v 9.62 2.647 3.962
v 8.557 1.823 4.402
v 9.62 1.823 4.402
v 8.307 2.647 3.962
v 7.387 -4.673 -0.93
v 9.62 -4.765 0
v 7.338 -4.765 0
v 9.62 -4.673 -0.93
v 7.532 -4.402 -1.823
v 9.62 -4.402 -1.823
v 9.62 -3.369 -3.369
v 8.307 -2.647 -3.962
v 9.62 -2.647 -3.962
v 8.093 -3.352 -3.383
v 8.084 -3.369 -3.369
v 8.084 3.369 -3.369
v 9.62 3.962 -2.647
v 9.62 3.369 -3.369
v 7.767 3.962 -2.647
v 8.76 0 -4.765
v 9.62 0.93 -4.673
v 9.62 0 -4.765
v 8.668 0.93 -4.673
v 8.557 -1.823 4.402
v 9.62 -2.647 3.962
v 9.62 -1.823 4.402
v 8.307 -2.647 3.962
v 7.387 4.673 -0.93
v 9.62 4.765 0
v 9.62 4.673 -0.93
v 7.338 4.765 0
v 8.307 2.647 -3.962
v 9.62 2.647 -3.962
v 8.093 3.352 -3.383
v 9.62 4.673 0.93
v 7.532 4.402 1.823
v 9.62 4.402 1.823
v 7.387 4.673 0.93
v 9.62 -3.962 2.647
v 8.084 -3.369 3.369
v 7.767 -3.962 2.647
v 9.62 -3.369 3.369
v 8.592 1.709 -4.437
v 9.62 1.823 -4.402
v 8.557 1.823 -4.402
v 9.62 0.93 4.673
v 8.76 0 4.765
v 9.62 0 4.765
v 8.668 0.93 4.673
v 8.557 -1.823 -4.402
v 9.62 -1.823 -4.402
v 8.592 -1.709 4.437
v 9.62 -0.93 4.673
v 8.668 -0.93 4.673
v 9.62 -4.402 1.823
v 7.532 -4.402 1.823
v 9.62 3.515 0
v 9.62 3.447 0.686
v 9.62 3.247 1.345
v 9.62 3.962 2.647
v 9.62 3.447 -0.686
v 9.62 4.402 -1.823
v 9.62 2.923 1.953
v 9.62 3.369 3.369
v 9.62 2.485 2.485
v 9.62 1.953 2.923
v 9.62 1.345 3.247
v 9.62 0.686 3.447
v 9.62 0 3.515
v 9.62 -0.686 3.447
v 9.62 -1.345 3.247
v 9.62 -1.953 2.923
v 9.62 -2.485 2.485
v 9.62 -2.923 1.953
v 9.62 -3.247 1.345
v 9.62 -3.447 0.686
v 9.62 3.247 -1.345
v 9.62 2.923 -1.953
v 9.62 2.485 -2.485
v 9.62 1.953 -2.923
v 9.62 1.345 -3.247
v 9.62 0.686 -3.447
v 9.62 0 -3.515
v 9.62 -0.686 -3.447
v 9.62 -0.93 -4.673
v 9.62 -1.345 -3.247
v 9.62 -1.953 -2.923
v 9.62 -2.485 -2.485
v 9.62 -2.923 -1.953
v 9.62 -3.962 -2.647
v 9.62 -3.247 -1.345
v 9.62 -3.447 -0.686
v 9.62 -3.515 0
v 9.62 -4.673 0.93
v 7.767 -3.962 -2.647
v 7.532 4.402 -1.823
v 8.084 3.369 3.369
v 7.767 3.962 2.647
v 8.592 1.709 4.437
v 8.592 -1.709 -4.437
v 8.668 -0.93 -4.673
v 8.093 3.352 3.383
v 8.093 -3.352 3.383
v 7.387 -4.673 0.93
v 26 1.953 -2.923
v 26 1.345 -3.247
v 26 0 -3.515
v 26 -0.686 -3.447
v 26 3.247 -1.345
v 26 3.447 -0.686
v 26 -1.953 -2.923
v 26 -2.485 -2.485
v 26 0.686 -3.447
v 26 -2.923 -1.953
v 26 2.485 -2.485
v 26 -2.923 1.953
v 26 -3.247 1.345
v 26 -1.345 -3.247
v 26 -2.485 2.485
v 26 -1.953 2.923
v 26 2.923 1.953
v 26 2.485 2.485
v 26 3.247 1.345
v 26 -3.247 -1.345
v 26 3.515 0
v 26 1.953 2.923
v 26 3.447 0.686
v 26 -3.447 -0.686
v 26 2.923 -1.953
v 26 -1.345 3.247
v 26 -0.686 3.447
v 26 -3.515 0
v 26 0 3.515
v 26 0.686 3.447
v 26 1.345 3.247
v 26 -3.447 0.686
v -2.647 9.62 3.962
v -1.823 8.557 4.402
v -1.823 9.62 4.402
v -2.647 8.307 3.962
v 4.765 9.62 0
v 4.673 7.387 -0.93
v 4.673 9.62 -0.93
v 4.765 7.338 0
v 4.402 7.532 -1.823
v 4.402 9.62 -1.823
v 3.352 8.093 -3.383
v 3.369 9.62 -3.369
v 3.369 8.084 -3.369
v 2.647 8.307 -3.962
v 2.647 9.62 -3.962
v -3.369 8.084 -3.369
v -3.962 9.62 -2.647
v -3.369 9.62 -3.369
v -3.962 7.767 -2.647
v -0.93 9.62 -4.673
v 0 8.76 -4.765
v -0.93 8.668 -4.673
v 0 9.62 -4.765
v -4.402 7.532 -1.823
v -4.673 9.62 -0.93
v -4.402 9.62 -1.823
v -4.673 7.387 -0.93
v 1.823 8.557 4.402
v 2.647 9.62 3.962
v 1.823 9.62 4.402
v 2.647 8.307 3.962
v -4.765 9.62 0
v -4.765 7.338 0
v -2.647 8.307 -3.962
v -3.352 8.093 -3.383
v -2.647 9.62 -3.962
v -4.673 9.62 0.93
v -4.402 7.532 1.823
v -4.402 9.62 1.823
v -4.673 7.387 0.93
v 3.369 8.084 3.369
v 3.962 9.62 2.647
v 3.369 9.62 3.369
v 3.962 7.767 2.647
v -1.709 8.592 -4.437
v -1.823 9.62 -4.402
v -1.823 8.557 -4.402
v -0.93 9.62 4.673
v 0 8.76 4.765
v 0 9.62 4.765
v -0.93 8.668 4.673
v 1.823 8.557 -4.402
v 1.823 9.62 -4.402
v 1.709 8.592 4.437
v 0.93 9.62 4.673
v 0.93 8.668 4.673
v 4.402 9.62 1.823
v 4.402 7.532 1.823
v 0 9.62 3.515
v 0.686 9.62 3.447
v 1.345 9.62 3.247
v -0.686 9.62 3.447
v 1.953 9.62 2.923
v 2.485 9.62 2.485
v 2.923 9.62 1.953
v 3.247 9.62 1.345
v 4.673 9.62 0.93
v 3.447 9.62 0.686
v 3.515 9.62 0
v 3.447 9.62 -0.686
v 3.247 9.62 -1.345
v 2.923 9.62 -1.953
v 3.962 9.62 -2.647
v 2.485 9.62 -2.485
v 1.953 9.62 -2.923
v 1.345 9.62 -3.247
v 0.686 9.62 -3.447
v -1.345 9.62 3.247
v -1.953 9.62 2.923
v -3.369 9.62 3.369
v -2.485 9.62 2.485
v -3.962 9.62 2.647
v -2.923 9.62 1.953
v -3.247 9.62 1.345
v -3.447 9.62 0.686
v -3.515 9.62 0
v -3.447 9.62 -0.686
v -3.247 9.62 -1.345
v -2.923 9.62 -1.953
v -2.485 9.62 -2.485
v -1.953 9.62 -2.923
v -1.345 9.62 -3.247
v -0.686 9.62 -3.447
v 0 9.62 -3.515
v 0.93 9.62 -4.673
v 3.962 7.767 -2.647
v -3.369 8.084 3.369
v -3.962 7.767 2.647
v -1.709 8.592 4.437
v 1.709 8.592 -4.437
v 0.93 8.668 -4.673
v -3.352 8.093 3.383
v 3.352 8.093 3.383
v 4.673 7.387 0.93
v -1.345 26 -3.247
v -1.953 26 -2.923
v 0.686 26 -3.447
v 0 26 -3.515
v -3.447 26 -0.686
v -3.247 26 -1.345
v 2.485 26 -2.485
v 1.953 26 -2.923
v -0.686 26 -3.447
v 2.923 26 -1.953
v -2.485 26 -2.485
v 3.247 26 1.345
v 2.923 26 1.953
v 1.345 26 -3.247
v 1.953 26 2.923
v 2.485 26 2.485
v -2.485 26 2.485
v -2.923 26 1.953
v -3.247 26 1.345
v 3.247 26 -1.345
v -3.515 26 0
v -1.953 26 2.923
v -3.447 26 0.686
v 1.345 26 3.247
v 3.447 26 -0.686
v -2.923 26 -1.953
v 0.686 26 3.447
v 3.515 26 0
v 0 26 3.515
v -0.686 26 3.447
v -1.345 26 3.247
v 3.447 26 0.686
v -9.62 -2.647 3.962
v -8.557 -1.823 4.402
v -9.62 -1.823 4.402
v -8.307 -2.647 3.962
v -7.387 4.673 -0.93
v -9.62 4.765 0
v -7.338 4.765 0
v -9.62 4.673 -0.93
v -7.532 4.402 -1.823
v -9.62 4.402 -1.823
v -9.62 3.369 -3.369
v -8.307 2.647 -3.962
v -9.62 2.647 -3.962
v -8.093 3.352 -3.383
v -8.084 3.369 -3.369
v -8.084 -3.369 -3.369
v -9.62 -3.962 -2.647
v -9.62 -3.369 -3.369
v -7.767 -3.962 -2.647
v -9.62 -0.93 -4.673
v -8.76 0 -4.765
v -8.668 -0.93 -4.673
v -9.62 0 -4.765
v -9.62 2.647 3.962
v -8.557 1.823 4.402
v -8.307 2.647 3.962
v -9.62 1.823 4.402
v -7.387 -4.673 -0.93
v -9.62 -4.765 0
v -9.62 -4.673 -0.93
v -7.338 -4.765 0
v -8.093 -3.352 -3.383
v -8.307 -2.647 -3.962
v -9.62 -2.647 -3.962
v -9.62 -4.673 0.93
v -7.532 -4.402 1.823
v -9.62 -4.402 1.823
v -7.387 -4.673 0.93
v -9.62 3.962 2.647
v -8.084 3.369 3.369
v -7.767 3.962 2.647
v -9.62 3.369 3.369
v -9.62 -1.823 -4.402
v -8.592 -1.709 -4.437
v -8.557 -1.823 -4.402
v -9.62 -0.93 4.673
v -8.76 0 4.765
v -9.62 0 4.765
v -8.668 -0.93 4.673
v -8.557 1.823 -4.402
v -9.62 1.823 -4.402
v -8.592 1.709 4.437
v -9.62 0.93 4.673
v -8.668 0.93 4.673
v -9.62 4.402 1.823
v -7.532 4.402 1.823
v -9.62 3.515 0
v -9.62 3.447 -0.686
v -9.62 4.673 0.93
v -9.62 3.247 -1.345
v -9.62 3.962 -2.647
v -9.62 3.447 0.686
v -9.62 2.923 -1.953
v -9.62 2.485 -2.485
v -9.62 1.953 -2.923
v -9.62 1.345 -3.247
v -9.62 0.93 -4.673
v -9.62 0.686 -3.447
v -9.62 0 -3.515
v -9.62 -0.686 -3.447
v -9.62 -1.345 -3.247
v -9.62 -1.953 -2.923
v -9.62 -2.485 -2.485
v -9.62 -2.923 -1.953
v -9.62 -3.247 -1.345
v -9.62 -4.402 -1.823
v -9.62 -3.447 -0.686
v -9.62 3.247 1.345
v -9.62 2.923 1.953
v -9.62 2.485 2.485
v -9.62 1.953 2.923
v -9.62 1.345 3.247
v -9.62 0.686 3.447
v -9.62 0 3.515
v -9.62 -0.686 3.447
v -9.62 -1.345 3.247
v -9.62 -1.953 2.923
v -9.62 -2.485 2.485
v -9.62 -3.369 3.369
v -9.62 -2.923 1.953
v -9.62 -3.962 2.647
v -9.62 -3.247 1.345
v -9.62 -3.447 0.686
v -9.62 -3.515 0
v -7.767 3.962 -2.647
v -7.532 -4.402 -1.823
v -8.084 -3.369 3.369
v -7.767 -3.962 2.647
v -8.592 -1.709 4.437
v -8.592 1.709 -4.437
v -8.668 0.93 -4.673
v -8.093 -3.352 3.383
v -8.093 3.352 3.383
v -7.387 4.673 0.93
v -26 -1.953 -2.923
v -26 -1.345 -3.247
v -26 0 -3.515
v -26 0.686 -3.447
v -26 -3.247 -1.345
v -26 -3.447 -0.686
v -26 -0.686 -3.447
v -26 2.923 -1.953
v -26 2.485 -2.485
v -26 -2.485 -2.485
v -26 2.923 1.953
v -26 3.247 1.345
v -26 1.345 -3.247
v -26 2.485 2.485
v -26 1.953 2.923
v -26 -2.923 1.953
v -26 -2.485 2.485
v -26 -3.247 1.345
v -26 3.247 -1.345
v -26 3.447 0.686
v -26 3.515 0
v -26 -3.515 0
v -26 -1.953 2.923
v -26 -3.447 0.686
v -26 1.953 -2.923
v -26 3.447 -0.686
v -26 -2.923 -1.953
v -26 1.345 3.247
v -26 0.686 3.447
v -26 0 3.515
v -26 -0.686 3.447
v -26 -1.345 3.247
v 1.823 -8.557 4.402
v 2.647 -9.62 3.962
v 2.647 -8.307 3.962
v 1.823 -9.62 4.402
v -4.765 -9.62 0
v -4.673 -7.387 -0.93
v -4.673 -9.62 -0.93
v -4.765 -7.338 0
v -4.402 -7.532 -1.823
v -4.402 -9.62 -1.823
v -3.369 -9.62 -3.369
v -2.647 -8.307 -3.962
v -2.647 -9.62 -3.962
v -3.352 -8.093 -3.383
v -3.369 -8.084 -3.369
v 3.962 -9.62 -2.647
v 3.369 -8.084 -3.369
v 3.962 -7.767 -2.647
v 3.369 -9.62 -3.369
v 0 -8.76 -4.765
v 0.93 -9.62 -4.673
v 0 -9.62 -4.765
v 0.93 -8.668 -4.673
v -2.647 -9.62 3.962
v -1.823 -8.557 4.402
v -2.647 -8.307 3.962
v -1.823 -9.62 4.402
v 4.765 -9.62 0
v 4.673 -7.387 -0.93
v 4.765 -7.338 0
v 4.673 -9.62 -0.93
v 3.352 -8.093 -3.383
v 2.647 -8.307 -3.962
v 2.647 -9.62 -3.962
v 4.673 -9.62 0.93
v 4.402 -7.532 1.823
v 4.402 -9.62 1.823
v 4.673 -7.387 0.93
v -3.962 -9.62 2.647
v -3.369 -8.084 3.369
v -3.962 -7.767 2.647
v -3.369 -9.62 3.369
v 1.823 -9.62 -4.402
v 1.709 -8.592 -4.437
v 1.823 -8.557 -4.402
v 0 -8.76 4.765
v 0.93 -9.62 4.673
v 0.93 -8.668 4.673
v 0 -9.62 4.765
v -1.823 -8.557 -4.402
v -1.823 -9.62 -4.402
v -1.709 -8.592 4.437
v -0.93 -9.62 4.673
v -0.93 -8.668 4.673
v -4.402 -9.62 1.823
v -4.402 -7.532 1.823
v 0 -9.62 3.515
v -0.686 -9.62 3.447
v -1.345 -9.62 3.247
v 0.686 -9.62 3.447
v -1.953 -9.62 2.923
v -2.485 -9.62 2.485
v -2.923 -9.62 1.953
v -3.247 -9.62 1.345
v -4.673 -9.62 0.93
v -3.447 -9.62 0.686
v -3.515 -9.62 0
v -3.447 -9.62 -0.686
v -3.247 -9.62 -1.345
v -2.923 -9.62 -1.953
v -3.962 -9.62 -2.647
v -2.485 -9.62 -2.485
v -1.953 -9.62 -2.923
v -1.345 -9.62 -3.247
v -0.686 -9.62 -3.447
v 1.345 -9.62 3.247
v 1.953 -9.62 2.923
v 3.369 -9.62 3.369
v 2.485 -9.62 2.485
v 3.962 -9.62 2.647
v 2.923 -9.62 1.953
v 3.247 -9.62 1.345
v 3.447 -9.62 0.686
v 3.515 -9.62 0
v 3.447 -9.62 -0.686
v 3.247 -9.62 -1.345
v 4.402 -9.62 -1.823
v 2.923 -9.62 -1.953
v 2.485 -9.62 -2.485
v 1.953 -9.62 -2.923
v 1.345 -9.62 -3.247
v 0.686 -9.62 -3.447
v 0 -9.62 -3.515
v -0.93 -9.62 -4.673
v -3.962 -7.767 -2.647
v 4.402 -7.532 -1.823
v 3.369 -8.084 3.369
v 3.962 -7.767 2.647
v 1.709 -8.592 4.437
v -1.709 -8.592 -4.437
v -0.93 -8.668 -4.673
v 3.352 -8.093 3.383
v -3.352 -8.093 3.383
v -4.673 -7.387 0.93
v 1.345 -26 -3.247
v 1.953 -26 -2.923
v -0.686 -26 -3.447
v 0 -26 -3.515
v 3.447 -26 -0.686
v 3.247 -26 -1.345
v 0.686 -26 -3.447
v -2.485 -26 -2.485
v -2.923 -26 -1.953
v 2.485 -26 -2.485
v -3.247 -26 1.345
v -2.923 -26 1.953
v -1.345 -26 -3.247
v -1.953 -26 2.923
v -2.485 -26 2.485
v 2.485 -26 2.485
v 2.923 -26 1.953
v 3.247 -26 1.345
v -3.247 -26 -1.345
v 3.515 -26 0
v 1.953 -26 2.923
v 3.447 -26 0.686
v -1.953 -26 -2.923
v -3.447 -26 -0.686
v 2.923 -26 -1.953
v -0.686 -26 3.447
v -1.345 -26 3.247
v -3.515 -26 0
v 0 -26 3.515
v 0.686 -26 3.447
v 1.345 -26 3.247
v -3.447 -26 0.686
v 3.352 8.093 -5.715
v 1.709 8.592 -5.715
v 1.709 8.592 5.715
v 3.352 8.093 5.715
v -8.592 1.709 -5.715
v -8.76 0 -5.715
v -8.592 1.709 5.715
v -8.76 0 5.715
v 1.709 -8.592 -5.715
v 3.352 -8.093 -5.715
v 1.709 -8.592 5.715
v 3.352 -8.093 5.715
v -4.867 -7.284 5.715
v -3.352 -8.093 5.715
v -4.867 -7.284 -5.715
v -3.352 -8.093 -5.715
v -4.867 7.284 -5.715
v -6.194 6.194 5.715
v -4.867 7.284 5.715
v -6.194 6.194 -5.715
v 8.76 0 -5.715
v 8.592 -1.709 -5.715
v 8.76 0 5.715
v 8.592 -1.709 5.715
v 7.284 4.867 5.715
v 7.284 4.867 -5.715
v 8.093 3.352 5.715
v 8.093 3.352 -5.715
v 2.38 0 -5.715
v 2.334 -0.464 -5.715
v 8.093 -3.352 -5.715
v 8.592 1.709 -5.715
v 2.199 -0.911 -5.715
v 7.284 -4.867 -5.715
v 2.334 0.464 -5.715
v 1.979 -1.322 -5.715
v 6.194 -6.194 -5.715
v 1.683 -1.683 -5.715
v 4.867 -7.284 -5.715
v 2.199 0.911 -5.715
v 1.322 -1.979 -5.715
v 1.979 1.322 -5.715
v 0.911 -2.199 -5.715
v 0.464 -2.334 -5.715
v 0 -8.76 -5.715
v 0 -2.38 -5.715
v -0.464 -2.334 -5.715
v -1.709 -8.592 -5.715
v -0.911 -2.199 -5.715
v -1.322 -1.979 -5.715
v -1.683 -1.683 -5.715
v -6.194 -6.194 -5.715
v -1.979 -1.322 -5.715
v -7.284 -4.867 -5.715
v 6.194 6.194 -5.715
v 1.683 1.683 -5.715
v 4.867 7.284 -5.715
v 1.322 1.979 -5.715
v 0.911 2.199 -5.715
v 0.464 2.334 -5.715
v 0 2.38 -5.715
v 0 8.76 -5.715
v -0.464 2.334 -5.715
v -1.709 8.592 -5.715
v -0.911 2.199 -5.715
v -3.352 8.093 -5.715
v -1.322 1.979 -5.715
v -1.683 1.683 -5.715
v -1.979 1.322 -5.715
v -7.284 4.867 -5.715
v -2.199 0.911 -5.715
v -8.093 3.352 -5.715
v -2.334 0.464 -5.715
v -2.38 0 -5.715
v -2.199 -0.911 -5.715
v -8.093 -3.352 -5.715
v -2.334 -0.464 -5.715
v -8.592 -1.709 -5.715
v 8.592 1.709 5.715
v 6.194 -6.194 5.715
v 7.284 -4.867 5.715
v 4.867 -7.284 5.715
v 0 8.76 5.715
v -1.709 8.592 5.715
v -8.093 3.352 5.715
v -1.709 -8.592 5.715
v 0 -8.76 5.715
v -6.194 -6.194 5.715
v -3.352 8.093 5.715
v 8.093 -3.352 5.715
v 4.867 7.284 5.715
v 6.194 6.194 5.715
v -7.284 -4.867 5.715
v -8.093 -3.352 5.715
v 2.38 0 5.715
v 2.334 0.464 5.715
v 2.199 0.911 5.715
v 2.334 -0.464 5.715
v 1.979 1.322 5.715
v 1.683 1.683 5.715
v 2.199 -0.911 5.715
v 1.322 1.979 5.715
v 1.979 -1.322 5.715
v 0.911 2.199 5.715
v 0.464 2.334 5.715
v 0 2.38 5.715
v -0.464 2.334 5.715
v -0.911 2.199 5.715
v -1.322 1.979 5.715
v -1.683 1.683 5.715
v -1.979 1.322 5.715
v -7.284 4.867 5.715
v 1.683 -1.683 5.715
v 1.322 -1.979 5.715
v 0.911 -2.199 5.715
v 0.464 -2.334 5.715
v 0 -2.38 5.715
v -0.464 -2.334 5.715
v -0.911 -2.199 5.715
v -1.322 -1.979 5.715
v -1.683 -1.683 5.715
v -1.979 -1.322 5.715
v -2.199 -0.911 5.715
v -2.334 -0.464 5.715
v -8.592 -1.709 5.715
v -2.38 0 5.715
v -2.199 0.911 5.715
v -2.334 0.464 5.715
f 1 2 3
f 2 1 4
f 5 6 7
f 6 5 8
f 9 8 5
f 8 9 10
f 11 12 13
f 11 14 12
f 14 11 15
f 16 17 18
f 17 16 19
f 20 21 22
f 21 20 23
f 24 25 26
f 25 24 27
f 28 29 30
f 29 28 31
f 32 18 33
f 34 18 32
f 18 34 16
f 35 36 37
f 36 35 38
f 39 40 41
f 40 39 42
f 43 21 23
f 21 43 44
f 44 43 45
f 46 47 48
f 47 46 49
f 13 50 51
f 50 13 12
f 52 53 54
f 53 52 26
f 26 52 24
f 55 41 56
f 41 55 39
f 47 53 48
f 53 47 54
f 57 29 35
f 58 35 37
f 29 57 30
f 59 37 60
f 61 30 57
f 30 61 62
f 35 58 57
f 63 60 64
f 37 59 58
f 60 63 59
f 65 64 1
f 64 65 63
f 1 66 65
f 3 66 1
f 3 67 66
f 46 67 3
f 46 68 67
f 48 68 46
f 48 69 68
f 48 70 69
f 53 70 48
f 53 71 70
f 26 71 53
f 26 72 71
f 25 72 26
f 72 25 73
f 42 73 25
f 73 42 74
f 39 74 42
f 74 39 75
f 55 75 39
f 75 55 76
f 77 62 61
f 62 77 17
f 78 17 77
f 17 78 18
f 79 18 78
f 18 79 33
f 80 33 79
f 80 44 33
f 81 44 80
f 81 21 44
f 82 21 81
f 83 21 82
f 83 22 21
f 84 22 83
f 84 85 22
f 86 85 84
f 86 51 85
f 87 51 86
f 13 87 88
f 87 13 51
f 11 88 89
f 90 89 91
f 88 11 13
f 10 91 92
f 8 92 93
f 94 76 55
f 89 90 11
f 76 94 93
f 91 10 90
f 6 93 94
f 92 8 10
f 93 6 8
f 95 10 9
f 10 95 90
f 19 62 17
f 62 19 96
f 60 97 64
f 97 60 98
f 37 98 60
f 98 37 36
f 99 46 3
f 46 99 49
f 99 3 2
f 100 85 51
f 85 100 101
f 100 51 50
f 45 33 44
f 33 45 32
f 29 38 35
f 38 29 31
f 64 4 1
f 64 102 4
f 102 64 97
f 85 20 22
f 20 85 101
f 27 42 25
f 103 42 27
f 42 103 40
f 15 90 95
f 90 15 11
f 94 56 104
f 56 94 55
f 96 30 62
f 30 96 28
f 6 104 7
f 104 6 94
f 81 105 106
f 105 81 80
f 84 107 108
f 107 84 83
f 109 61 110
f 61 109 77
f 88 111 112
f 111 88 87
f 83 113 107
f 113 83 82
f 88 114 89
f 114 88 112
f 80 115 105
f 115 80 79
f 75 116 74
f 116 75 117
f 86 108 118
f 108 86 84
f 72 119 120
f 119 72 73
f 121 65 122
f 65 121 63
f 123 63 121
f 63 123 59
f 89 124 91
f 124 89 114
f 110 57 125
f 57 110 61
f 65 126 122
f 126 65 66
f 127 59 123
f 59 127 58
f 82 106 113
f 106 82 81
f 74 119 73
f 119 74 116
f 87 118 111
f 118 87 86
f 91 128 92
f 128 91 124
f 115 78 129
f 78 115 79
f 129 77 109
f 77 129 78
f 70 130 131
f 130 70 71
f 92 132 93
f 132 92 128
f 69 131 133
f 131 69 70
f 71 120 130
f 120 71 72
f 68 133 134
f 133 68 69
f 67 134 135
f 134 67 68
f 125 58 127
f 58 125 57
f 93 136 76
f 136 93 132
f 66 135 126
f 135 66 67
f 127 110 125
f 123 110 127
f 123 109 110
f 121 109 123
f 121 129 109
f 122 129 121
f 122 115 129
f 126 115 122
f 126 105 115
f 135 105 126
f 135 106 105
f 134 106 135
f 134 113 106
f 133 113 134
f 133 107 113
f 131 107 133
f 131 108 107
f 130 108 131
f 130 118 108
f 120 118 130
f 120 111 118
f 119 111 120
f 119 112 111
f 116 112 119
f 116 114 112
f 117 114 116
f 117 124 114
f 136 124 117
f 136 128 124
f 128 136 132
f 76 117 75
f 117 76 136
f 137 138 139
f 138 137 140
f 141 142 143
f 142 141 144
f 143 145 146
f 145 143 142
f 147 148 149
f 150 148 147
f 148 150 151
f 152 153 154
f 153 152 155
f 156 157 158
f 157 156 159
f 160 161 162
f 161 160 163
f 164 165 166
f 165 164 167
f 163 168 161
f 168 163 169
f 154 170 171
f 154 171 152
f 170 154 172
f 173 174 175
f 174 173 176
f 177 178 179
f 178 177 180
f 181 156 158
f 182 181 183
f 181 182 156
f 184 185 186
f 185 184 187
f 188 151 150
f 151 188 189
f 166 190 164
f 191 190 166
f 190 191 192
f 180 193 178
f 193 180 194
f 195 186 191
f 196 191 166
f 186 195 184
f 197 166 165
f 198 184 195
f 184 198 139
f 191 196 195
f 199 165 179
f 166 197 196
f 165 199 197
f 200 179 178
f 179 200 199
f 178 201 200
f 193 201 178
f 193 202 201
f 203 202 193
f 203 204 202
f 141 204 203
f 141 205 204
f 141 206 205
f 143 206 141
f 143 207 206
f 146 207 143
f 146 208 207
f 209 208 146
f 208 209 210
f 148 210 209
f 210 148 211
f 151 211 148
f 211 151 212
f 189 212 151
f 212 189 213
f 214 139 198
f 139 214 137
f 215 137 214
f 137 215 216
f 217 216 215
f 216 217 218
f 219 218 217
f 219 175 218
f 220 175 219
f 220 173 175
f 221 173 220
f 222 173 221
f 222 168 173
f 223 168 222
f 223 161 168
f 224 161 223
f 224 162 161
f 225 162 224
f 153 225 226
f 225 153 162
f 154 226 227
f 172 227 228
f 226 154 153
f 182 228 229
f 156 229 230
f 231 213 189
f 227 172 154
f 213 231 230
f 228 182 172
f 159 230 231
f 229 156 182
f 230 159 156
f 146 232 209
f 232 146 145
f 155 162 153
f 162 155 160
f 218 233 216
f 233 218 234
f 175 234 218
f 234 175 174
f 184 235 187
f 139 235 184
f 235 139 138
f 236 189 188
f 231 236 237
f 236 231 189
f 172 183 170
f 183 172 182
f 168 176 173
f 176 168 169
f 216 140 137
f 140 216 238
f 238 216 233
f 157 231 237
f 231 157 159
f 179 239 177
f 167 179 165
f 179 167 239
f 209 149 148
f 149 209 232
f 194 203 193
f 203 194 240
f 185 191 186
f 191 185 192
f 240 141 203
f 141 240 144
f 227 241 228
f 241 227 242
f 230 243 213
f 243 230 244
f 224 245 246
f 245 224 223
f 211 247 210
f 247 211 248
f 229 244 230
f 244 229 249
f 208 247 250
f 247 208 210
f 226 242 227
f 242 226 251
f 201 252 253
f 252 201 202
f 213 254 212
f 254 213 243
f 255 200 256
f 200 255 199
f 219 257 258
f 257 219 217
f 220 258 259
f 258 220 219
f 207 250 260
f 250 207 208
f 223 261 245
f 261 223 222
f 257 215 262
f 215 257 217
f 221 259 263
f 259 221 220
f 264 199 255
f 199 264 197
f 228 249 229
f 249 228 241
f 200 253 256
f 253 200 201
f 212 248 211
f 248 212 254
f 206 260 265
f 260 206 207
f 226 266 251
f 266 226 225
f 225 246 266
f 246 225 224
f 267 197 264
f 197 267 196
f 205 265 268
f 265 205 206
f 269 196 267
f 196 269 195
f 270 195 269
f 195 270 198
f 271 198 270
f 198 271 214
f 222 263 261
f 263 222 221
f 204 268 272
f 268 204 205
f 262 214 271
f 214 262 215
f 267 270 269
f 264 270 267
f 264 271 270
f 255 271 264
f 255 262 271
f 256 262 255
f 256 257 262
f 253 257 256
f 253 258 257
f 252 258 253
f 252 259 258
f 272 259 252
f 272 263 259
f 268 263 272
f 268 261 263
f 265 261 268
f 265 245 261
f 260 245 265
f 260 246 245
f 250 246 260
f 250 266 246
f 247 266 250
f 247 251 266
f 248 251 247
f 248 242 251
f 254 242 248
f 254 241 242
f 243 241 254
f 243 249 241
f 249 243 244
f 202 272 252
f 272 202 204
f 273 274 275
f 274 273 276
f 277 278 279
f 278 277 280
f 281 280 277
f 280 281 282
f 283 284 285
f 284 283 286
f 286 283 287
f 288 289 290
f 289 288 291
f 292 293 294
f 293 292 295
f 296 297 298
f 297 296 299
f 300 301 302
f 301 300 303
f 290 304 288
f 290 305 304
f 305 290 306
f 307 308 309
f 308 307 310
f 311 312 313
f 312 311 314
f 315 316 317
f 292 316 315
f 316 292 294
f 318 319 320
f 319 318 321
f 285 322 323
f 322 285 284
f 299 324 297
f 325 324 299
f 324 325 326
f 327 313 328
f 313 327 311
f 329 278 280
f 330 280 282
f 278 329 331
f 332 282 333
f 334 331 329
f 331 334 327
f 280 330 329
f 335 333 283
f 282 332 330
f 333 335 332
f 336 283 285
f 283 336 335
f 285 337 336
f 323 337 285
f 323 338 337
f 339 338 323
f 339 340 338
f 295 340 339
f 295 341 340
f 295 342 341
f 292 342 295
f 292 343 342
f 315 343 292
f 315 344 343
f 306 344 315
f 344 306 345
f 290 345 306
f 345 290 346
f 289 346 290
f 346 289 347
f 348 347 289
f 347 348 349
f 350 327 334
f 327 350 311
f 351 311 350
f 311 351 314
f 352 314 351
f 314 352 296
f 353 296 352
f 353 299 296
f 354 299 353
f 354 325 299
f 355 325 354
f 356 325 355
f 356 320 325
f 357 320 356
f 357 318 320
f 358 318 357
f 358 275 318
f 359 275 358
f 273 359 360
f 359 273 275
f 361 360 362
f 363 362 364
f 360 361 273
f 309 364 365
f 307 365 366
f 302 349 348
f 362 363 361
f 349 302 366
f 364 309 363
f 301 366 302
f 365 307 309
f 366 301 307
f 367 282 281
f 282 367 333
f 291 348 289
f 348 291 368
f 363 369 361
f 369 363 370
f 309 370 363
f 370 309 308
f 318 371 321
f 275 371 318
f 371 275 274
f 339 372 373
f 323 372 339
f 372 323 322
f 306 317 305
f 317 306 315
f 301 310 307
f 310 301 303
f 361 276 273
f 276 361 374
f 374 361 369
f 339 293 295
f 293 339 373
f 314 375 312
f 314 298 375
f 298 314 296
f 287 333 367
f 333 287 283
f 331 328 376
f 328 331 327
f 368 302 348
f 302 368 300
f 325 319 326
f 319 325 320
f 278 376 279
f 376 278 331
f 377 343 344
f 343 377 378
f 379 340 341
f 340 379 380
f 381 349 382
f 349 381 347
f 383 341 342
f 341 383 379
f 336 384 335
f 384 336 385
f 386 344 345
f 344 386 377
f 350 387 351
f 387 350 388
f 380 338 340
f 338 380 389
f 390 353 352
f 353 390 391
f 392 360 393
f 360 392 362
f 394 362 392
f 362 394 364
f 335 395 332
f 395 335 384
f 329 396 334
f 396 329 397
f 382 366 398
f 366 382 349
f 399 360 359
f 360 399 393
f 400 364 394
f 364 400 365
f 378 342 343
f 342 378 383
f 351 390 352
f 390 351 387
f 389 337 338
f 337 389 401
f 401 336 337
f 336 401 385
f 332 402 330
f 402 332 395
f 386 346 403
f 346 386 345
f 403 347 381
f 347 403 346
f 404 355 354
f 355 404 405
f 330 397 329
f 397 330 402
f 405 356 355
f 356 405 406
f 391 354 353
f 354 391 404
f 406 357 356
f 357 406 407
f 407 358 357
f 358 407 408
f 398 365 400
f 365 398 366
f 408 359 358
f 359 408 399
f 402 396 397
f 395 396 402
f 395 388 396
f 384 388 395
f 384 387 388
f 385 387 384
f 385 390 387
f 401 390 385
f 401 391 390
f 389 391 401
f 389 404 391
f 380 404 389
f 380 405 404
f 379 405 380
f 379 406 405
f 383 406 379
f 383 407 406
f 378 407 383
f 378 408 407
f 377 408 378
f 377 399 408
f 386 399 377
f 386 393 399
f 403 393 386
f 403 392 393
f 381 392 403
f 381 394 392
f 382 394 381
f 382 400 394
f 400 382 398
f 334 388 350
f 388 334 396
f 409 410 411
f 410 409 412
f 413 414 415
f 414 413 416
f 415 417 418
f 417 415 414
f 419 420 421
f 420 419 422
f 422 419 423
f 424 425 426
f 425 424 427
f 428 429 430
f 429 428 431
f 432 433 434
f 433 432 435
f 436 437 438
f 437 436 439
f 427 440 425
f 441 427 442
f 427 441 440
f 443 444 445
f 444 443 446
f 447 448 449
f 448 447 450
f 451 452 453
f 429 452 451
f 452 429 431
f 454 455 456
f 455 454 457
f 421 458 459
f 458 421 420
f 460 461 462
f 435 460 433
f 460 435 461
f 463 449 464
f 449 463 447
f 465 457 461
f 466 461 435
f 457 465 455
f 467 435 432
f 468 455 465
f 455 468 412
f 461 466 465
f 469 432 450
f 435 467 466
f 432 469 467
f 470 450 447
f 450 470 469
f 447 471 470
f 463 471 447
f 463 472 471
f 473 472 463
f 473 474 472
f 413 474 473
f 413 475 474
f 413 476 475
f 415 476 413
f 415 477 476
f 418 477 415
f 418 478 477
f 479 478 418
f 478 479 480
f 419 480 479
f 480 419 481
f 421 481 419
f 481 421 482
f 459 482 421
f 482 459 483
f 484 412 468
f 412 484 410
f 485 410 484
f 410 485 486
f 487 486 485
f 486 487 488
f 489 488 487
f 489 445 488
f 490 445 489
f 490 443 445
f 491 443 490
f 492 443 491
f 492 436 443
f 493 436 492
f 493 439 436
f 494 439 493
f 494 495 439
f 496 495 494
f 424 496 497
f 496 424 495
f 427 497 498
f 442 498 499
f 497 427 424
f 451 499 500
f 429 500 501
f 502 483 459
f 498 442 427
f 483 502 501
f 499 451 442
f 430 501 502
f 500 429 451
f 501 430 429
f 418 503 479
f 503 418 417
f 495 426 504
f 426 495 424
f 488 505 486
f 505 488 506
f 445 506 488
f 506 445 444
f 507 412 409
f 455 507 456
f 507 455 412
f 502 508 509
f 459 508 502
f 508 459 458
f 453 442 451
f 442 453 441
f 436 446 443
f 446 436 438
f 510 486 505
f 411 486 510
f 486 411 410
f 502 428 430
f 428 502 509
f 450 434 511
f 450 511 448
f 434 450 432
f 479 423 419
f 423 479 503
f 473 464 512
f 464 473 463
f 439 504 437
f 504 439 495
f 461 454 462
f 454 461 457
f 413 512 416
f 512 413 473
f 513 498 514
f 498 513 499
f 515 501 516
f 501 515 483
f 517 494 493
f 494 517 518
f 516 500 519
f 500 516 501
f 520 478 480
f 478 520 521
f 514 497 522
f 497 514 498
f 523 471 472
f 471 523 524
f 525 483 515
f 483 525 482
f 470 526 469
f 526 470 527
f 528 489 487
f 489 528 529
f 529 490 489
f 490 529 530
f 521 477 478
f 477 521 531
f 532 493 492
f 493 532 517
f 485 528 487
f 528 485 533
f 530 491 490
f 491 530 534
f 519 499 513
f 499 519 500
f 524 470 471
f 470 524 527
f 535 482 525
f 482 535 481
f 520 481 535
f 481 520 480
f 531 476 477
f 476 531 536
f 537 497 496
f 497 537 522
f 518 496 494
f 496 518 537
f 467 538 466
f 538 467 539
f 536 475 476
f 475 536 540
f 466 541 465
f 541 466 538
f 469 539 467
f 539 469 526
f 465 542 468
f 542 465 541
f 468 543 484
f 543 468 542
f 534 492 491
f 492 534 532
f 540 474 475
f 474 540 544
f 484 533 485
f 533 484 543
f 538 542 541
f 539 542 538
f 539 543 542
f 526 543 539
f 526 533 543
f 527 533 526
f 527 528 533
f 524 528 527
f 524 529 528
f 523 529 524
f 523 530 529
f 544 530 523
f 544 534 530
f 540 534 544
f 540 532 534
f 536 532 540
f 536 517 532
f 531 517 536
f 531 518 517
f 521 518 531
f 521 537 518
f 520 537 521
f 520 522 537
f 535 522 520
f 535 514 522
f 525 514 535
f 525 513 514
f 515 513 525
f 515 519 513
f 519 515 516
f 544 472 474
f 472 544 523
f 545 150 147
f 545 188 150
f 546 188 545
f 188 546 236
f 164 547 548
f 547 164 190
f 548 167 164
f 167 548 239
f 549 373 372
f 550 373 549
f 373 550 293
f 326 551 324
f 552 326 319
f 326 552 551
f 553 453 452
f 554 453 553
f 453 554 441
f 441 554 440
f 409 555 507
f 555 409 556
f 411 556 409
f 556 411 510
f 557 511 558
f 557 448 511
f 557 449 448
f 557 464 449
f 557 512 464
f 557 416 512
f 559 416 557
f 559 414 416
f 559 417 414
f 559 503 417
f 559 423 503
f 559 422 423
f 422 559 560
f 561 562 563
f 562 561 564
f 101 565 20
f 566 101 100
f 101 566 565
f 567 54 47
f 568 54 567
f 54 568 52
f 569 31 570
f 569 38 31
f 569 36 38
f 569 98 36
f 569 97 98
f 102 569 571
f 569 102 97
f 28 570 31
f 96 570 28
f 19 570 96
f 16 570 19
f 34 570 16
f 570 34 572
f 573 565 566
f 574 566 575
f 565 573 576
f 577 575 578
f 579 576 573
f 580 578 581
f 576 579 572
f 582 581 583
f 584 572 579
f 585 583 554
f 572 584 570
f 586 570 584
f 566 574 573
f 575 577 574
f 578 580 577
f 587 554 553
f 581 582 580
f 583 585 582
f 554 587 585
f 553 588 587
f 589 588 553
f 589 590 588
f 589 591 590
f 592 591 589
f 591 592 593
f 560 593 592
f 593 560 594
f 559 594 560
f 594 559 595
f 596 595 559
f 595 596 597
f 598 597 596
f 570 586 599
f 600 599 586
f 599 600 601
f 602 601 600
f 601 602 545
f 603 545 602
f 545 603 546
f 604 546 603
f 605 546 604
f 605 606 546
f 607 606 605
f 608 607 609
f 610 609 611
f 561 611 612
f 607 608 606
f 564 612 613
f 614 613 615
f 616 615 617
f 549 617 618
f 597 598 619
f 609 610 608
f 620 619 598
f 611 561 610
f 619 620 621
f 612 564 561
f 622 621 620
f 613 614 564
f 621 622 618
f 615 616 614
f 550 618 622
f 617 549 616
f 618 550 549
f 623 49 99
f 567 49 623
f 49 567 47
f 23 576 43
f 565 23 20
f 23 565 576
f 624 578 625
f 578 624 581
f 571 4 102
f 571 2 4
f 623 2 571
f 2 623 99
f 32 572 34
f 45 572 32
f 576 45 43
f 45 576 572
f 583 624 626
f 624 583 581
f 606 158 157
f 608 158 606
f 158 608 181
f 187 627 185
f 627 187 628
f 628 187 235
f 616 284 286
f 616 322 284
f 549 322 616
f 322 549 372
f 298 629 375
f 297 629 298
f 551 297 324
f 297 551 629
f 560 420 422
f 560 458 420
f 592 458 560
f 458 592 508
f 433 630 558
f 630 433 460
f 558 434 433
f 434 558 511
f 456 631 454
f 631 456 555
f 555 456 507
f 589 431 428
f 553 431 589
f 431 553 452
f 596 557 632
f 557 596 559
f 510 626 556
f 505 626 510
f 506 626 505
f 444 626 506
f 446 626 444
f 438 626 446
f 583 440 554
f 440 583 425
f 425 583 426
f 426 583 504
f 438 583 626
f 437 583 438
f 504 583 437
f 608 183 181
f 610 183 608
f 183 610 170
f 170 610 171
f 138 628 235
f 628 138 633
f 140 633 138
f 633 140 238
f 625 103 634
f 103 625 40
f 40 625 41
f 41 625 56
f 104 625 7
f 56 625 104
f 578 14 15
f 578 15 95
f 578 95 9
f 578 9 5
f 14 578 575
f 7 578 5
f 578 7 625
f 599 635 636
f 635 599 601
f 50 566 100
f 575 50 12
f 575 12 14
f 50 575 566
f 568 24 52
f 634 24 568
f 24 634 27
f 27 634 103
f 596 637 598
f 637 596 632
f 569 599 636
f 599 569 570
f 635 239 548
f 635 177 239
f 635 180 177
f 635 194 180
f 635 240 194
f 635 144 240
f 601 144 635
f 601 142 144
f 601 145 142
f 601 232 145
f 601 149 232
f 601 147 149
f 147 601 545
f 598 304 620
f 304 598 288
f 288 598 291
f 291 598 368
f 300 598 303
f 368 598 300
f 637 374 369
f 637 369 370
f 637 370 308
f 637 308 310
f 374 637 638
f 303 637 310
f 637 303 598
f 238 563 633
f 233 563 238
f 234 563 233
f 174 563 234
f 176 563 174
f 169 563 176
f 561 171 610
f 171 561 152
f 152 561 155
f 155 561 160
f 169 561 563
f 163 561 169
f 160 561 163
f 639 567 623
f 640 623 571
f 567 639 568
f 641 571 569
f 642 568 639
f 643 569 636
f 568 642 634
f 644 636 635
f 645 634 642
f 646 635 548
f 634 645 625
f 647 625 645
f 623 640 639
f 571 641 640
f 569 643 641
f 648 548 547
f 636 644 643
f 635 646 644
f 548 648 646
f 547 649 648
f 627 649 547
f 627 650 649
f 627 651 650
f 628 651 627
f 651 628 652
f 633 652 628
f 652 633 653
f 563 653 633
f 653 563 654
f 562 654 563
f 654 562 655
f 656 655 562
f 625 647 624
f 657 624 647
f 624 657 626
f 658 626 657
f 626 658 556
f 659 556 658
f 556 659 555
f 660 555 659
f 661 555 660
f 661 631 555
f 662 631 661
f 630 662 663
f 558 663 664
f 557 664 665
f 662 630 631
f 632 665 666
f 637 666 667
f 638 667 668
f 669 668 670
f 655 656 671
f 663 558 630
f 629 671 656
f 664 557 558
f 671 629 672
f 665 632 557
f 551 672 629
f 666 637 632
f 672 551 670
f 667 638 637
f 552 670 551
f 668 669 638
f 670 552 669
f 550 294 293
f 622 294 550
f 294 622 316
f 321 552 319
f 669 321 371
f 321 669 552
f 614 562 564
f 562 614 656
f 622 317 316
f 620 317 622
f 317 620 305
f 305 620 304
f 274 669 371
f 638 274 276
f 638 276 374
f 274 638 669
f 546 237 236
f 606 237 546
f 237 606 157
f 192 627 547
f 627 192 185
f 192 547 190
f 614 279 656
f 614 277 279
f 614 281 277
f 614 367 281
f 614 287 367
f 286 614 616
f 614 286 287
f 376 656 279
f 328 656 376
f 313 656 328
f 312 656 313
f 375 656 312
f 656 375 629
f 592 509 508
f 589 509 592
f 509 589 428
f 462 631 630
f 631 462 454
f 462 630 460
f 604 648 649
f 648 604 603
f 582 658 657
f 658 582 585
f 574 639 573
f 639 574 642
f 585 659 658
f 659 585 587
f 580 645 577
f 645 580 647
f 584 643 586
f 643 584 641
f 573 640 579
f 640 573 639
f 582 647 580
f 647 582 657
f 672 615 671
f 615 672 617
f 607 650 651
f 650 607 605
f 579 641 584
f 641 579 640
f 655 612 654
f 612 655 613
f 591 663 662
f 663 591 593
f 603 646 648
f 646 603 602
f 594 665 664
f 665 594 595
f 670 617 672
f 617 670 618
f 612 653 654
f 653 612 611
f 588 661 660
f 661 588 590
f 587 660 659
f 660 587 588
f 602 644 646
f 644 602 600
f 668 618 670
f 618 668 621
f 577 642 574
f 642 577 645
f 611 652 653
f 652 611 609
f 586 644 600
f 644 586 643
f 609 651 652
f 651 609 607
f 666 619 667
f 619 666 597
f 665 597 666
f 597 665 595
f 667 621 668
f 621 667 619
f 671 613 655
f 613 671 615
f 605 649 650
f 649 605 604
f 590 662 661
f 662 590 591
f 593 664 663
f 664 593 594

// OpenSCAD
$fn = 32;

// ----------------------------------------------------------------------
// Cardan cross: 52 mm span, 9.53 mm trunnions
// ----------------------------------------------------------------------

// --- parameters (mm) ---
journal_d = 9.53;         // trunnion diameter
arm_len = 26;             // trunnion length from the centre
step_r = 3.24;            // step position from the centre
step_d = 7.03;            // journal diameter after the step
hub_d = 17.52;            // hub diameter
hub_h = 11.43;            // hub height
bore_d = 4.76;            // hub bore

difference() {
  union() {
    /* hub along the joint axis */
    cylinder(h = hub_h, d = hub_d, center = true);
    for (a = [0 : 90 : 270]) rotate([0, 0, a]) {
      /* trunnion, sunk into the hub */
      translate([hub_d / 4, 0, 0]) rotate([0, 90, 0]) cylinder(h = step_r + 2, d = journal_d);
      /* stepped journal out to the tip */
      translate([step_r - 0.5, 0, 0]) rotate([0, 90, 0]) cylinder(h = arm_len + 0.5 - step_r, d = step_d);
    }
  }
  /* lubrication bore through the hub, 2.5 mm clear on both sides */
  translate([0, 0, -hub_h / 2 - 2.5]) cylinder(h = hub_h + 5, d = bore_d);
}
